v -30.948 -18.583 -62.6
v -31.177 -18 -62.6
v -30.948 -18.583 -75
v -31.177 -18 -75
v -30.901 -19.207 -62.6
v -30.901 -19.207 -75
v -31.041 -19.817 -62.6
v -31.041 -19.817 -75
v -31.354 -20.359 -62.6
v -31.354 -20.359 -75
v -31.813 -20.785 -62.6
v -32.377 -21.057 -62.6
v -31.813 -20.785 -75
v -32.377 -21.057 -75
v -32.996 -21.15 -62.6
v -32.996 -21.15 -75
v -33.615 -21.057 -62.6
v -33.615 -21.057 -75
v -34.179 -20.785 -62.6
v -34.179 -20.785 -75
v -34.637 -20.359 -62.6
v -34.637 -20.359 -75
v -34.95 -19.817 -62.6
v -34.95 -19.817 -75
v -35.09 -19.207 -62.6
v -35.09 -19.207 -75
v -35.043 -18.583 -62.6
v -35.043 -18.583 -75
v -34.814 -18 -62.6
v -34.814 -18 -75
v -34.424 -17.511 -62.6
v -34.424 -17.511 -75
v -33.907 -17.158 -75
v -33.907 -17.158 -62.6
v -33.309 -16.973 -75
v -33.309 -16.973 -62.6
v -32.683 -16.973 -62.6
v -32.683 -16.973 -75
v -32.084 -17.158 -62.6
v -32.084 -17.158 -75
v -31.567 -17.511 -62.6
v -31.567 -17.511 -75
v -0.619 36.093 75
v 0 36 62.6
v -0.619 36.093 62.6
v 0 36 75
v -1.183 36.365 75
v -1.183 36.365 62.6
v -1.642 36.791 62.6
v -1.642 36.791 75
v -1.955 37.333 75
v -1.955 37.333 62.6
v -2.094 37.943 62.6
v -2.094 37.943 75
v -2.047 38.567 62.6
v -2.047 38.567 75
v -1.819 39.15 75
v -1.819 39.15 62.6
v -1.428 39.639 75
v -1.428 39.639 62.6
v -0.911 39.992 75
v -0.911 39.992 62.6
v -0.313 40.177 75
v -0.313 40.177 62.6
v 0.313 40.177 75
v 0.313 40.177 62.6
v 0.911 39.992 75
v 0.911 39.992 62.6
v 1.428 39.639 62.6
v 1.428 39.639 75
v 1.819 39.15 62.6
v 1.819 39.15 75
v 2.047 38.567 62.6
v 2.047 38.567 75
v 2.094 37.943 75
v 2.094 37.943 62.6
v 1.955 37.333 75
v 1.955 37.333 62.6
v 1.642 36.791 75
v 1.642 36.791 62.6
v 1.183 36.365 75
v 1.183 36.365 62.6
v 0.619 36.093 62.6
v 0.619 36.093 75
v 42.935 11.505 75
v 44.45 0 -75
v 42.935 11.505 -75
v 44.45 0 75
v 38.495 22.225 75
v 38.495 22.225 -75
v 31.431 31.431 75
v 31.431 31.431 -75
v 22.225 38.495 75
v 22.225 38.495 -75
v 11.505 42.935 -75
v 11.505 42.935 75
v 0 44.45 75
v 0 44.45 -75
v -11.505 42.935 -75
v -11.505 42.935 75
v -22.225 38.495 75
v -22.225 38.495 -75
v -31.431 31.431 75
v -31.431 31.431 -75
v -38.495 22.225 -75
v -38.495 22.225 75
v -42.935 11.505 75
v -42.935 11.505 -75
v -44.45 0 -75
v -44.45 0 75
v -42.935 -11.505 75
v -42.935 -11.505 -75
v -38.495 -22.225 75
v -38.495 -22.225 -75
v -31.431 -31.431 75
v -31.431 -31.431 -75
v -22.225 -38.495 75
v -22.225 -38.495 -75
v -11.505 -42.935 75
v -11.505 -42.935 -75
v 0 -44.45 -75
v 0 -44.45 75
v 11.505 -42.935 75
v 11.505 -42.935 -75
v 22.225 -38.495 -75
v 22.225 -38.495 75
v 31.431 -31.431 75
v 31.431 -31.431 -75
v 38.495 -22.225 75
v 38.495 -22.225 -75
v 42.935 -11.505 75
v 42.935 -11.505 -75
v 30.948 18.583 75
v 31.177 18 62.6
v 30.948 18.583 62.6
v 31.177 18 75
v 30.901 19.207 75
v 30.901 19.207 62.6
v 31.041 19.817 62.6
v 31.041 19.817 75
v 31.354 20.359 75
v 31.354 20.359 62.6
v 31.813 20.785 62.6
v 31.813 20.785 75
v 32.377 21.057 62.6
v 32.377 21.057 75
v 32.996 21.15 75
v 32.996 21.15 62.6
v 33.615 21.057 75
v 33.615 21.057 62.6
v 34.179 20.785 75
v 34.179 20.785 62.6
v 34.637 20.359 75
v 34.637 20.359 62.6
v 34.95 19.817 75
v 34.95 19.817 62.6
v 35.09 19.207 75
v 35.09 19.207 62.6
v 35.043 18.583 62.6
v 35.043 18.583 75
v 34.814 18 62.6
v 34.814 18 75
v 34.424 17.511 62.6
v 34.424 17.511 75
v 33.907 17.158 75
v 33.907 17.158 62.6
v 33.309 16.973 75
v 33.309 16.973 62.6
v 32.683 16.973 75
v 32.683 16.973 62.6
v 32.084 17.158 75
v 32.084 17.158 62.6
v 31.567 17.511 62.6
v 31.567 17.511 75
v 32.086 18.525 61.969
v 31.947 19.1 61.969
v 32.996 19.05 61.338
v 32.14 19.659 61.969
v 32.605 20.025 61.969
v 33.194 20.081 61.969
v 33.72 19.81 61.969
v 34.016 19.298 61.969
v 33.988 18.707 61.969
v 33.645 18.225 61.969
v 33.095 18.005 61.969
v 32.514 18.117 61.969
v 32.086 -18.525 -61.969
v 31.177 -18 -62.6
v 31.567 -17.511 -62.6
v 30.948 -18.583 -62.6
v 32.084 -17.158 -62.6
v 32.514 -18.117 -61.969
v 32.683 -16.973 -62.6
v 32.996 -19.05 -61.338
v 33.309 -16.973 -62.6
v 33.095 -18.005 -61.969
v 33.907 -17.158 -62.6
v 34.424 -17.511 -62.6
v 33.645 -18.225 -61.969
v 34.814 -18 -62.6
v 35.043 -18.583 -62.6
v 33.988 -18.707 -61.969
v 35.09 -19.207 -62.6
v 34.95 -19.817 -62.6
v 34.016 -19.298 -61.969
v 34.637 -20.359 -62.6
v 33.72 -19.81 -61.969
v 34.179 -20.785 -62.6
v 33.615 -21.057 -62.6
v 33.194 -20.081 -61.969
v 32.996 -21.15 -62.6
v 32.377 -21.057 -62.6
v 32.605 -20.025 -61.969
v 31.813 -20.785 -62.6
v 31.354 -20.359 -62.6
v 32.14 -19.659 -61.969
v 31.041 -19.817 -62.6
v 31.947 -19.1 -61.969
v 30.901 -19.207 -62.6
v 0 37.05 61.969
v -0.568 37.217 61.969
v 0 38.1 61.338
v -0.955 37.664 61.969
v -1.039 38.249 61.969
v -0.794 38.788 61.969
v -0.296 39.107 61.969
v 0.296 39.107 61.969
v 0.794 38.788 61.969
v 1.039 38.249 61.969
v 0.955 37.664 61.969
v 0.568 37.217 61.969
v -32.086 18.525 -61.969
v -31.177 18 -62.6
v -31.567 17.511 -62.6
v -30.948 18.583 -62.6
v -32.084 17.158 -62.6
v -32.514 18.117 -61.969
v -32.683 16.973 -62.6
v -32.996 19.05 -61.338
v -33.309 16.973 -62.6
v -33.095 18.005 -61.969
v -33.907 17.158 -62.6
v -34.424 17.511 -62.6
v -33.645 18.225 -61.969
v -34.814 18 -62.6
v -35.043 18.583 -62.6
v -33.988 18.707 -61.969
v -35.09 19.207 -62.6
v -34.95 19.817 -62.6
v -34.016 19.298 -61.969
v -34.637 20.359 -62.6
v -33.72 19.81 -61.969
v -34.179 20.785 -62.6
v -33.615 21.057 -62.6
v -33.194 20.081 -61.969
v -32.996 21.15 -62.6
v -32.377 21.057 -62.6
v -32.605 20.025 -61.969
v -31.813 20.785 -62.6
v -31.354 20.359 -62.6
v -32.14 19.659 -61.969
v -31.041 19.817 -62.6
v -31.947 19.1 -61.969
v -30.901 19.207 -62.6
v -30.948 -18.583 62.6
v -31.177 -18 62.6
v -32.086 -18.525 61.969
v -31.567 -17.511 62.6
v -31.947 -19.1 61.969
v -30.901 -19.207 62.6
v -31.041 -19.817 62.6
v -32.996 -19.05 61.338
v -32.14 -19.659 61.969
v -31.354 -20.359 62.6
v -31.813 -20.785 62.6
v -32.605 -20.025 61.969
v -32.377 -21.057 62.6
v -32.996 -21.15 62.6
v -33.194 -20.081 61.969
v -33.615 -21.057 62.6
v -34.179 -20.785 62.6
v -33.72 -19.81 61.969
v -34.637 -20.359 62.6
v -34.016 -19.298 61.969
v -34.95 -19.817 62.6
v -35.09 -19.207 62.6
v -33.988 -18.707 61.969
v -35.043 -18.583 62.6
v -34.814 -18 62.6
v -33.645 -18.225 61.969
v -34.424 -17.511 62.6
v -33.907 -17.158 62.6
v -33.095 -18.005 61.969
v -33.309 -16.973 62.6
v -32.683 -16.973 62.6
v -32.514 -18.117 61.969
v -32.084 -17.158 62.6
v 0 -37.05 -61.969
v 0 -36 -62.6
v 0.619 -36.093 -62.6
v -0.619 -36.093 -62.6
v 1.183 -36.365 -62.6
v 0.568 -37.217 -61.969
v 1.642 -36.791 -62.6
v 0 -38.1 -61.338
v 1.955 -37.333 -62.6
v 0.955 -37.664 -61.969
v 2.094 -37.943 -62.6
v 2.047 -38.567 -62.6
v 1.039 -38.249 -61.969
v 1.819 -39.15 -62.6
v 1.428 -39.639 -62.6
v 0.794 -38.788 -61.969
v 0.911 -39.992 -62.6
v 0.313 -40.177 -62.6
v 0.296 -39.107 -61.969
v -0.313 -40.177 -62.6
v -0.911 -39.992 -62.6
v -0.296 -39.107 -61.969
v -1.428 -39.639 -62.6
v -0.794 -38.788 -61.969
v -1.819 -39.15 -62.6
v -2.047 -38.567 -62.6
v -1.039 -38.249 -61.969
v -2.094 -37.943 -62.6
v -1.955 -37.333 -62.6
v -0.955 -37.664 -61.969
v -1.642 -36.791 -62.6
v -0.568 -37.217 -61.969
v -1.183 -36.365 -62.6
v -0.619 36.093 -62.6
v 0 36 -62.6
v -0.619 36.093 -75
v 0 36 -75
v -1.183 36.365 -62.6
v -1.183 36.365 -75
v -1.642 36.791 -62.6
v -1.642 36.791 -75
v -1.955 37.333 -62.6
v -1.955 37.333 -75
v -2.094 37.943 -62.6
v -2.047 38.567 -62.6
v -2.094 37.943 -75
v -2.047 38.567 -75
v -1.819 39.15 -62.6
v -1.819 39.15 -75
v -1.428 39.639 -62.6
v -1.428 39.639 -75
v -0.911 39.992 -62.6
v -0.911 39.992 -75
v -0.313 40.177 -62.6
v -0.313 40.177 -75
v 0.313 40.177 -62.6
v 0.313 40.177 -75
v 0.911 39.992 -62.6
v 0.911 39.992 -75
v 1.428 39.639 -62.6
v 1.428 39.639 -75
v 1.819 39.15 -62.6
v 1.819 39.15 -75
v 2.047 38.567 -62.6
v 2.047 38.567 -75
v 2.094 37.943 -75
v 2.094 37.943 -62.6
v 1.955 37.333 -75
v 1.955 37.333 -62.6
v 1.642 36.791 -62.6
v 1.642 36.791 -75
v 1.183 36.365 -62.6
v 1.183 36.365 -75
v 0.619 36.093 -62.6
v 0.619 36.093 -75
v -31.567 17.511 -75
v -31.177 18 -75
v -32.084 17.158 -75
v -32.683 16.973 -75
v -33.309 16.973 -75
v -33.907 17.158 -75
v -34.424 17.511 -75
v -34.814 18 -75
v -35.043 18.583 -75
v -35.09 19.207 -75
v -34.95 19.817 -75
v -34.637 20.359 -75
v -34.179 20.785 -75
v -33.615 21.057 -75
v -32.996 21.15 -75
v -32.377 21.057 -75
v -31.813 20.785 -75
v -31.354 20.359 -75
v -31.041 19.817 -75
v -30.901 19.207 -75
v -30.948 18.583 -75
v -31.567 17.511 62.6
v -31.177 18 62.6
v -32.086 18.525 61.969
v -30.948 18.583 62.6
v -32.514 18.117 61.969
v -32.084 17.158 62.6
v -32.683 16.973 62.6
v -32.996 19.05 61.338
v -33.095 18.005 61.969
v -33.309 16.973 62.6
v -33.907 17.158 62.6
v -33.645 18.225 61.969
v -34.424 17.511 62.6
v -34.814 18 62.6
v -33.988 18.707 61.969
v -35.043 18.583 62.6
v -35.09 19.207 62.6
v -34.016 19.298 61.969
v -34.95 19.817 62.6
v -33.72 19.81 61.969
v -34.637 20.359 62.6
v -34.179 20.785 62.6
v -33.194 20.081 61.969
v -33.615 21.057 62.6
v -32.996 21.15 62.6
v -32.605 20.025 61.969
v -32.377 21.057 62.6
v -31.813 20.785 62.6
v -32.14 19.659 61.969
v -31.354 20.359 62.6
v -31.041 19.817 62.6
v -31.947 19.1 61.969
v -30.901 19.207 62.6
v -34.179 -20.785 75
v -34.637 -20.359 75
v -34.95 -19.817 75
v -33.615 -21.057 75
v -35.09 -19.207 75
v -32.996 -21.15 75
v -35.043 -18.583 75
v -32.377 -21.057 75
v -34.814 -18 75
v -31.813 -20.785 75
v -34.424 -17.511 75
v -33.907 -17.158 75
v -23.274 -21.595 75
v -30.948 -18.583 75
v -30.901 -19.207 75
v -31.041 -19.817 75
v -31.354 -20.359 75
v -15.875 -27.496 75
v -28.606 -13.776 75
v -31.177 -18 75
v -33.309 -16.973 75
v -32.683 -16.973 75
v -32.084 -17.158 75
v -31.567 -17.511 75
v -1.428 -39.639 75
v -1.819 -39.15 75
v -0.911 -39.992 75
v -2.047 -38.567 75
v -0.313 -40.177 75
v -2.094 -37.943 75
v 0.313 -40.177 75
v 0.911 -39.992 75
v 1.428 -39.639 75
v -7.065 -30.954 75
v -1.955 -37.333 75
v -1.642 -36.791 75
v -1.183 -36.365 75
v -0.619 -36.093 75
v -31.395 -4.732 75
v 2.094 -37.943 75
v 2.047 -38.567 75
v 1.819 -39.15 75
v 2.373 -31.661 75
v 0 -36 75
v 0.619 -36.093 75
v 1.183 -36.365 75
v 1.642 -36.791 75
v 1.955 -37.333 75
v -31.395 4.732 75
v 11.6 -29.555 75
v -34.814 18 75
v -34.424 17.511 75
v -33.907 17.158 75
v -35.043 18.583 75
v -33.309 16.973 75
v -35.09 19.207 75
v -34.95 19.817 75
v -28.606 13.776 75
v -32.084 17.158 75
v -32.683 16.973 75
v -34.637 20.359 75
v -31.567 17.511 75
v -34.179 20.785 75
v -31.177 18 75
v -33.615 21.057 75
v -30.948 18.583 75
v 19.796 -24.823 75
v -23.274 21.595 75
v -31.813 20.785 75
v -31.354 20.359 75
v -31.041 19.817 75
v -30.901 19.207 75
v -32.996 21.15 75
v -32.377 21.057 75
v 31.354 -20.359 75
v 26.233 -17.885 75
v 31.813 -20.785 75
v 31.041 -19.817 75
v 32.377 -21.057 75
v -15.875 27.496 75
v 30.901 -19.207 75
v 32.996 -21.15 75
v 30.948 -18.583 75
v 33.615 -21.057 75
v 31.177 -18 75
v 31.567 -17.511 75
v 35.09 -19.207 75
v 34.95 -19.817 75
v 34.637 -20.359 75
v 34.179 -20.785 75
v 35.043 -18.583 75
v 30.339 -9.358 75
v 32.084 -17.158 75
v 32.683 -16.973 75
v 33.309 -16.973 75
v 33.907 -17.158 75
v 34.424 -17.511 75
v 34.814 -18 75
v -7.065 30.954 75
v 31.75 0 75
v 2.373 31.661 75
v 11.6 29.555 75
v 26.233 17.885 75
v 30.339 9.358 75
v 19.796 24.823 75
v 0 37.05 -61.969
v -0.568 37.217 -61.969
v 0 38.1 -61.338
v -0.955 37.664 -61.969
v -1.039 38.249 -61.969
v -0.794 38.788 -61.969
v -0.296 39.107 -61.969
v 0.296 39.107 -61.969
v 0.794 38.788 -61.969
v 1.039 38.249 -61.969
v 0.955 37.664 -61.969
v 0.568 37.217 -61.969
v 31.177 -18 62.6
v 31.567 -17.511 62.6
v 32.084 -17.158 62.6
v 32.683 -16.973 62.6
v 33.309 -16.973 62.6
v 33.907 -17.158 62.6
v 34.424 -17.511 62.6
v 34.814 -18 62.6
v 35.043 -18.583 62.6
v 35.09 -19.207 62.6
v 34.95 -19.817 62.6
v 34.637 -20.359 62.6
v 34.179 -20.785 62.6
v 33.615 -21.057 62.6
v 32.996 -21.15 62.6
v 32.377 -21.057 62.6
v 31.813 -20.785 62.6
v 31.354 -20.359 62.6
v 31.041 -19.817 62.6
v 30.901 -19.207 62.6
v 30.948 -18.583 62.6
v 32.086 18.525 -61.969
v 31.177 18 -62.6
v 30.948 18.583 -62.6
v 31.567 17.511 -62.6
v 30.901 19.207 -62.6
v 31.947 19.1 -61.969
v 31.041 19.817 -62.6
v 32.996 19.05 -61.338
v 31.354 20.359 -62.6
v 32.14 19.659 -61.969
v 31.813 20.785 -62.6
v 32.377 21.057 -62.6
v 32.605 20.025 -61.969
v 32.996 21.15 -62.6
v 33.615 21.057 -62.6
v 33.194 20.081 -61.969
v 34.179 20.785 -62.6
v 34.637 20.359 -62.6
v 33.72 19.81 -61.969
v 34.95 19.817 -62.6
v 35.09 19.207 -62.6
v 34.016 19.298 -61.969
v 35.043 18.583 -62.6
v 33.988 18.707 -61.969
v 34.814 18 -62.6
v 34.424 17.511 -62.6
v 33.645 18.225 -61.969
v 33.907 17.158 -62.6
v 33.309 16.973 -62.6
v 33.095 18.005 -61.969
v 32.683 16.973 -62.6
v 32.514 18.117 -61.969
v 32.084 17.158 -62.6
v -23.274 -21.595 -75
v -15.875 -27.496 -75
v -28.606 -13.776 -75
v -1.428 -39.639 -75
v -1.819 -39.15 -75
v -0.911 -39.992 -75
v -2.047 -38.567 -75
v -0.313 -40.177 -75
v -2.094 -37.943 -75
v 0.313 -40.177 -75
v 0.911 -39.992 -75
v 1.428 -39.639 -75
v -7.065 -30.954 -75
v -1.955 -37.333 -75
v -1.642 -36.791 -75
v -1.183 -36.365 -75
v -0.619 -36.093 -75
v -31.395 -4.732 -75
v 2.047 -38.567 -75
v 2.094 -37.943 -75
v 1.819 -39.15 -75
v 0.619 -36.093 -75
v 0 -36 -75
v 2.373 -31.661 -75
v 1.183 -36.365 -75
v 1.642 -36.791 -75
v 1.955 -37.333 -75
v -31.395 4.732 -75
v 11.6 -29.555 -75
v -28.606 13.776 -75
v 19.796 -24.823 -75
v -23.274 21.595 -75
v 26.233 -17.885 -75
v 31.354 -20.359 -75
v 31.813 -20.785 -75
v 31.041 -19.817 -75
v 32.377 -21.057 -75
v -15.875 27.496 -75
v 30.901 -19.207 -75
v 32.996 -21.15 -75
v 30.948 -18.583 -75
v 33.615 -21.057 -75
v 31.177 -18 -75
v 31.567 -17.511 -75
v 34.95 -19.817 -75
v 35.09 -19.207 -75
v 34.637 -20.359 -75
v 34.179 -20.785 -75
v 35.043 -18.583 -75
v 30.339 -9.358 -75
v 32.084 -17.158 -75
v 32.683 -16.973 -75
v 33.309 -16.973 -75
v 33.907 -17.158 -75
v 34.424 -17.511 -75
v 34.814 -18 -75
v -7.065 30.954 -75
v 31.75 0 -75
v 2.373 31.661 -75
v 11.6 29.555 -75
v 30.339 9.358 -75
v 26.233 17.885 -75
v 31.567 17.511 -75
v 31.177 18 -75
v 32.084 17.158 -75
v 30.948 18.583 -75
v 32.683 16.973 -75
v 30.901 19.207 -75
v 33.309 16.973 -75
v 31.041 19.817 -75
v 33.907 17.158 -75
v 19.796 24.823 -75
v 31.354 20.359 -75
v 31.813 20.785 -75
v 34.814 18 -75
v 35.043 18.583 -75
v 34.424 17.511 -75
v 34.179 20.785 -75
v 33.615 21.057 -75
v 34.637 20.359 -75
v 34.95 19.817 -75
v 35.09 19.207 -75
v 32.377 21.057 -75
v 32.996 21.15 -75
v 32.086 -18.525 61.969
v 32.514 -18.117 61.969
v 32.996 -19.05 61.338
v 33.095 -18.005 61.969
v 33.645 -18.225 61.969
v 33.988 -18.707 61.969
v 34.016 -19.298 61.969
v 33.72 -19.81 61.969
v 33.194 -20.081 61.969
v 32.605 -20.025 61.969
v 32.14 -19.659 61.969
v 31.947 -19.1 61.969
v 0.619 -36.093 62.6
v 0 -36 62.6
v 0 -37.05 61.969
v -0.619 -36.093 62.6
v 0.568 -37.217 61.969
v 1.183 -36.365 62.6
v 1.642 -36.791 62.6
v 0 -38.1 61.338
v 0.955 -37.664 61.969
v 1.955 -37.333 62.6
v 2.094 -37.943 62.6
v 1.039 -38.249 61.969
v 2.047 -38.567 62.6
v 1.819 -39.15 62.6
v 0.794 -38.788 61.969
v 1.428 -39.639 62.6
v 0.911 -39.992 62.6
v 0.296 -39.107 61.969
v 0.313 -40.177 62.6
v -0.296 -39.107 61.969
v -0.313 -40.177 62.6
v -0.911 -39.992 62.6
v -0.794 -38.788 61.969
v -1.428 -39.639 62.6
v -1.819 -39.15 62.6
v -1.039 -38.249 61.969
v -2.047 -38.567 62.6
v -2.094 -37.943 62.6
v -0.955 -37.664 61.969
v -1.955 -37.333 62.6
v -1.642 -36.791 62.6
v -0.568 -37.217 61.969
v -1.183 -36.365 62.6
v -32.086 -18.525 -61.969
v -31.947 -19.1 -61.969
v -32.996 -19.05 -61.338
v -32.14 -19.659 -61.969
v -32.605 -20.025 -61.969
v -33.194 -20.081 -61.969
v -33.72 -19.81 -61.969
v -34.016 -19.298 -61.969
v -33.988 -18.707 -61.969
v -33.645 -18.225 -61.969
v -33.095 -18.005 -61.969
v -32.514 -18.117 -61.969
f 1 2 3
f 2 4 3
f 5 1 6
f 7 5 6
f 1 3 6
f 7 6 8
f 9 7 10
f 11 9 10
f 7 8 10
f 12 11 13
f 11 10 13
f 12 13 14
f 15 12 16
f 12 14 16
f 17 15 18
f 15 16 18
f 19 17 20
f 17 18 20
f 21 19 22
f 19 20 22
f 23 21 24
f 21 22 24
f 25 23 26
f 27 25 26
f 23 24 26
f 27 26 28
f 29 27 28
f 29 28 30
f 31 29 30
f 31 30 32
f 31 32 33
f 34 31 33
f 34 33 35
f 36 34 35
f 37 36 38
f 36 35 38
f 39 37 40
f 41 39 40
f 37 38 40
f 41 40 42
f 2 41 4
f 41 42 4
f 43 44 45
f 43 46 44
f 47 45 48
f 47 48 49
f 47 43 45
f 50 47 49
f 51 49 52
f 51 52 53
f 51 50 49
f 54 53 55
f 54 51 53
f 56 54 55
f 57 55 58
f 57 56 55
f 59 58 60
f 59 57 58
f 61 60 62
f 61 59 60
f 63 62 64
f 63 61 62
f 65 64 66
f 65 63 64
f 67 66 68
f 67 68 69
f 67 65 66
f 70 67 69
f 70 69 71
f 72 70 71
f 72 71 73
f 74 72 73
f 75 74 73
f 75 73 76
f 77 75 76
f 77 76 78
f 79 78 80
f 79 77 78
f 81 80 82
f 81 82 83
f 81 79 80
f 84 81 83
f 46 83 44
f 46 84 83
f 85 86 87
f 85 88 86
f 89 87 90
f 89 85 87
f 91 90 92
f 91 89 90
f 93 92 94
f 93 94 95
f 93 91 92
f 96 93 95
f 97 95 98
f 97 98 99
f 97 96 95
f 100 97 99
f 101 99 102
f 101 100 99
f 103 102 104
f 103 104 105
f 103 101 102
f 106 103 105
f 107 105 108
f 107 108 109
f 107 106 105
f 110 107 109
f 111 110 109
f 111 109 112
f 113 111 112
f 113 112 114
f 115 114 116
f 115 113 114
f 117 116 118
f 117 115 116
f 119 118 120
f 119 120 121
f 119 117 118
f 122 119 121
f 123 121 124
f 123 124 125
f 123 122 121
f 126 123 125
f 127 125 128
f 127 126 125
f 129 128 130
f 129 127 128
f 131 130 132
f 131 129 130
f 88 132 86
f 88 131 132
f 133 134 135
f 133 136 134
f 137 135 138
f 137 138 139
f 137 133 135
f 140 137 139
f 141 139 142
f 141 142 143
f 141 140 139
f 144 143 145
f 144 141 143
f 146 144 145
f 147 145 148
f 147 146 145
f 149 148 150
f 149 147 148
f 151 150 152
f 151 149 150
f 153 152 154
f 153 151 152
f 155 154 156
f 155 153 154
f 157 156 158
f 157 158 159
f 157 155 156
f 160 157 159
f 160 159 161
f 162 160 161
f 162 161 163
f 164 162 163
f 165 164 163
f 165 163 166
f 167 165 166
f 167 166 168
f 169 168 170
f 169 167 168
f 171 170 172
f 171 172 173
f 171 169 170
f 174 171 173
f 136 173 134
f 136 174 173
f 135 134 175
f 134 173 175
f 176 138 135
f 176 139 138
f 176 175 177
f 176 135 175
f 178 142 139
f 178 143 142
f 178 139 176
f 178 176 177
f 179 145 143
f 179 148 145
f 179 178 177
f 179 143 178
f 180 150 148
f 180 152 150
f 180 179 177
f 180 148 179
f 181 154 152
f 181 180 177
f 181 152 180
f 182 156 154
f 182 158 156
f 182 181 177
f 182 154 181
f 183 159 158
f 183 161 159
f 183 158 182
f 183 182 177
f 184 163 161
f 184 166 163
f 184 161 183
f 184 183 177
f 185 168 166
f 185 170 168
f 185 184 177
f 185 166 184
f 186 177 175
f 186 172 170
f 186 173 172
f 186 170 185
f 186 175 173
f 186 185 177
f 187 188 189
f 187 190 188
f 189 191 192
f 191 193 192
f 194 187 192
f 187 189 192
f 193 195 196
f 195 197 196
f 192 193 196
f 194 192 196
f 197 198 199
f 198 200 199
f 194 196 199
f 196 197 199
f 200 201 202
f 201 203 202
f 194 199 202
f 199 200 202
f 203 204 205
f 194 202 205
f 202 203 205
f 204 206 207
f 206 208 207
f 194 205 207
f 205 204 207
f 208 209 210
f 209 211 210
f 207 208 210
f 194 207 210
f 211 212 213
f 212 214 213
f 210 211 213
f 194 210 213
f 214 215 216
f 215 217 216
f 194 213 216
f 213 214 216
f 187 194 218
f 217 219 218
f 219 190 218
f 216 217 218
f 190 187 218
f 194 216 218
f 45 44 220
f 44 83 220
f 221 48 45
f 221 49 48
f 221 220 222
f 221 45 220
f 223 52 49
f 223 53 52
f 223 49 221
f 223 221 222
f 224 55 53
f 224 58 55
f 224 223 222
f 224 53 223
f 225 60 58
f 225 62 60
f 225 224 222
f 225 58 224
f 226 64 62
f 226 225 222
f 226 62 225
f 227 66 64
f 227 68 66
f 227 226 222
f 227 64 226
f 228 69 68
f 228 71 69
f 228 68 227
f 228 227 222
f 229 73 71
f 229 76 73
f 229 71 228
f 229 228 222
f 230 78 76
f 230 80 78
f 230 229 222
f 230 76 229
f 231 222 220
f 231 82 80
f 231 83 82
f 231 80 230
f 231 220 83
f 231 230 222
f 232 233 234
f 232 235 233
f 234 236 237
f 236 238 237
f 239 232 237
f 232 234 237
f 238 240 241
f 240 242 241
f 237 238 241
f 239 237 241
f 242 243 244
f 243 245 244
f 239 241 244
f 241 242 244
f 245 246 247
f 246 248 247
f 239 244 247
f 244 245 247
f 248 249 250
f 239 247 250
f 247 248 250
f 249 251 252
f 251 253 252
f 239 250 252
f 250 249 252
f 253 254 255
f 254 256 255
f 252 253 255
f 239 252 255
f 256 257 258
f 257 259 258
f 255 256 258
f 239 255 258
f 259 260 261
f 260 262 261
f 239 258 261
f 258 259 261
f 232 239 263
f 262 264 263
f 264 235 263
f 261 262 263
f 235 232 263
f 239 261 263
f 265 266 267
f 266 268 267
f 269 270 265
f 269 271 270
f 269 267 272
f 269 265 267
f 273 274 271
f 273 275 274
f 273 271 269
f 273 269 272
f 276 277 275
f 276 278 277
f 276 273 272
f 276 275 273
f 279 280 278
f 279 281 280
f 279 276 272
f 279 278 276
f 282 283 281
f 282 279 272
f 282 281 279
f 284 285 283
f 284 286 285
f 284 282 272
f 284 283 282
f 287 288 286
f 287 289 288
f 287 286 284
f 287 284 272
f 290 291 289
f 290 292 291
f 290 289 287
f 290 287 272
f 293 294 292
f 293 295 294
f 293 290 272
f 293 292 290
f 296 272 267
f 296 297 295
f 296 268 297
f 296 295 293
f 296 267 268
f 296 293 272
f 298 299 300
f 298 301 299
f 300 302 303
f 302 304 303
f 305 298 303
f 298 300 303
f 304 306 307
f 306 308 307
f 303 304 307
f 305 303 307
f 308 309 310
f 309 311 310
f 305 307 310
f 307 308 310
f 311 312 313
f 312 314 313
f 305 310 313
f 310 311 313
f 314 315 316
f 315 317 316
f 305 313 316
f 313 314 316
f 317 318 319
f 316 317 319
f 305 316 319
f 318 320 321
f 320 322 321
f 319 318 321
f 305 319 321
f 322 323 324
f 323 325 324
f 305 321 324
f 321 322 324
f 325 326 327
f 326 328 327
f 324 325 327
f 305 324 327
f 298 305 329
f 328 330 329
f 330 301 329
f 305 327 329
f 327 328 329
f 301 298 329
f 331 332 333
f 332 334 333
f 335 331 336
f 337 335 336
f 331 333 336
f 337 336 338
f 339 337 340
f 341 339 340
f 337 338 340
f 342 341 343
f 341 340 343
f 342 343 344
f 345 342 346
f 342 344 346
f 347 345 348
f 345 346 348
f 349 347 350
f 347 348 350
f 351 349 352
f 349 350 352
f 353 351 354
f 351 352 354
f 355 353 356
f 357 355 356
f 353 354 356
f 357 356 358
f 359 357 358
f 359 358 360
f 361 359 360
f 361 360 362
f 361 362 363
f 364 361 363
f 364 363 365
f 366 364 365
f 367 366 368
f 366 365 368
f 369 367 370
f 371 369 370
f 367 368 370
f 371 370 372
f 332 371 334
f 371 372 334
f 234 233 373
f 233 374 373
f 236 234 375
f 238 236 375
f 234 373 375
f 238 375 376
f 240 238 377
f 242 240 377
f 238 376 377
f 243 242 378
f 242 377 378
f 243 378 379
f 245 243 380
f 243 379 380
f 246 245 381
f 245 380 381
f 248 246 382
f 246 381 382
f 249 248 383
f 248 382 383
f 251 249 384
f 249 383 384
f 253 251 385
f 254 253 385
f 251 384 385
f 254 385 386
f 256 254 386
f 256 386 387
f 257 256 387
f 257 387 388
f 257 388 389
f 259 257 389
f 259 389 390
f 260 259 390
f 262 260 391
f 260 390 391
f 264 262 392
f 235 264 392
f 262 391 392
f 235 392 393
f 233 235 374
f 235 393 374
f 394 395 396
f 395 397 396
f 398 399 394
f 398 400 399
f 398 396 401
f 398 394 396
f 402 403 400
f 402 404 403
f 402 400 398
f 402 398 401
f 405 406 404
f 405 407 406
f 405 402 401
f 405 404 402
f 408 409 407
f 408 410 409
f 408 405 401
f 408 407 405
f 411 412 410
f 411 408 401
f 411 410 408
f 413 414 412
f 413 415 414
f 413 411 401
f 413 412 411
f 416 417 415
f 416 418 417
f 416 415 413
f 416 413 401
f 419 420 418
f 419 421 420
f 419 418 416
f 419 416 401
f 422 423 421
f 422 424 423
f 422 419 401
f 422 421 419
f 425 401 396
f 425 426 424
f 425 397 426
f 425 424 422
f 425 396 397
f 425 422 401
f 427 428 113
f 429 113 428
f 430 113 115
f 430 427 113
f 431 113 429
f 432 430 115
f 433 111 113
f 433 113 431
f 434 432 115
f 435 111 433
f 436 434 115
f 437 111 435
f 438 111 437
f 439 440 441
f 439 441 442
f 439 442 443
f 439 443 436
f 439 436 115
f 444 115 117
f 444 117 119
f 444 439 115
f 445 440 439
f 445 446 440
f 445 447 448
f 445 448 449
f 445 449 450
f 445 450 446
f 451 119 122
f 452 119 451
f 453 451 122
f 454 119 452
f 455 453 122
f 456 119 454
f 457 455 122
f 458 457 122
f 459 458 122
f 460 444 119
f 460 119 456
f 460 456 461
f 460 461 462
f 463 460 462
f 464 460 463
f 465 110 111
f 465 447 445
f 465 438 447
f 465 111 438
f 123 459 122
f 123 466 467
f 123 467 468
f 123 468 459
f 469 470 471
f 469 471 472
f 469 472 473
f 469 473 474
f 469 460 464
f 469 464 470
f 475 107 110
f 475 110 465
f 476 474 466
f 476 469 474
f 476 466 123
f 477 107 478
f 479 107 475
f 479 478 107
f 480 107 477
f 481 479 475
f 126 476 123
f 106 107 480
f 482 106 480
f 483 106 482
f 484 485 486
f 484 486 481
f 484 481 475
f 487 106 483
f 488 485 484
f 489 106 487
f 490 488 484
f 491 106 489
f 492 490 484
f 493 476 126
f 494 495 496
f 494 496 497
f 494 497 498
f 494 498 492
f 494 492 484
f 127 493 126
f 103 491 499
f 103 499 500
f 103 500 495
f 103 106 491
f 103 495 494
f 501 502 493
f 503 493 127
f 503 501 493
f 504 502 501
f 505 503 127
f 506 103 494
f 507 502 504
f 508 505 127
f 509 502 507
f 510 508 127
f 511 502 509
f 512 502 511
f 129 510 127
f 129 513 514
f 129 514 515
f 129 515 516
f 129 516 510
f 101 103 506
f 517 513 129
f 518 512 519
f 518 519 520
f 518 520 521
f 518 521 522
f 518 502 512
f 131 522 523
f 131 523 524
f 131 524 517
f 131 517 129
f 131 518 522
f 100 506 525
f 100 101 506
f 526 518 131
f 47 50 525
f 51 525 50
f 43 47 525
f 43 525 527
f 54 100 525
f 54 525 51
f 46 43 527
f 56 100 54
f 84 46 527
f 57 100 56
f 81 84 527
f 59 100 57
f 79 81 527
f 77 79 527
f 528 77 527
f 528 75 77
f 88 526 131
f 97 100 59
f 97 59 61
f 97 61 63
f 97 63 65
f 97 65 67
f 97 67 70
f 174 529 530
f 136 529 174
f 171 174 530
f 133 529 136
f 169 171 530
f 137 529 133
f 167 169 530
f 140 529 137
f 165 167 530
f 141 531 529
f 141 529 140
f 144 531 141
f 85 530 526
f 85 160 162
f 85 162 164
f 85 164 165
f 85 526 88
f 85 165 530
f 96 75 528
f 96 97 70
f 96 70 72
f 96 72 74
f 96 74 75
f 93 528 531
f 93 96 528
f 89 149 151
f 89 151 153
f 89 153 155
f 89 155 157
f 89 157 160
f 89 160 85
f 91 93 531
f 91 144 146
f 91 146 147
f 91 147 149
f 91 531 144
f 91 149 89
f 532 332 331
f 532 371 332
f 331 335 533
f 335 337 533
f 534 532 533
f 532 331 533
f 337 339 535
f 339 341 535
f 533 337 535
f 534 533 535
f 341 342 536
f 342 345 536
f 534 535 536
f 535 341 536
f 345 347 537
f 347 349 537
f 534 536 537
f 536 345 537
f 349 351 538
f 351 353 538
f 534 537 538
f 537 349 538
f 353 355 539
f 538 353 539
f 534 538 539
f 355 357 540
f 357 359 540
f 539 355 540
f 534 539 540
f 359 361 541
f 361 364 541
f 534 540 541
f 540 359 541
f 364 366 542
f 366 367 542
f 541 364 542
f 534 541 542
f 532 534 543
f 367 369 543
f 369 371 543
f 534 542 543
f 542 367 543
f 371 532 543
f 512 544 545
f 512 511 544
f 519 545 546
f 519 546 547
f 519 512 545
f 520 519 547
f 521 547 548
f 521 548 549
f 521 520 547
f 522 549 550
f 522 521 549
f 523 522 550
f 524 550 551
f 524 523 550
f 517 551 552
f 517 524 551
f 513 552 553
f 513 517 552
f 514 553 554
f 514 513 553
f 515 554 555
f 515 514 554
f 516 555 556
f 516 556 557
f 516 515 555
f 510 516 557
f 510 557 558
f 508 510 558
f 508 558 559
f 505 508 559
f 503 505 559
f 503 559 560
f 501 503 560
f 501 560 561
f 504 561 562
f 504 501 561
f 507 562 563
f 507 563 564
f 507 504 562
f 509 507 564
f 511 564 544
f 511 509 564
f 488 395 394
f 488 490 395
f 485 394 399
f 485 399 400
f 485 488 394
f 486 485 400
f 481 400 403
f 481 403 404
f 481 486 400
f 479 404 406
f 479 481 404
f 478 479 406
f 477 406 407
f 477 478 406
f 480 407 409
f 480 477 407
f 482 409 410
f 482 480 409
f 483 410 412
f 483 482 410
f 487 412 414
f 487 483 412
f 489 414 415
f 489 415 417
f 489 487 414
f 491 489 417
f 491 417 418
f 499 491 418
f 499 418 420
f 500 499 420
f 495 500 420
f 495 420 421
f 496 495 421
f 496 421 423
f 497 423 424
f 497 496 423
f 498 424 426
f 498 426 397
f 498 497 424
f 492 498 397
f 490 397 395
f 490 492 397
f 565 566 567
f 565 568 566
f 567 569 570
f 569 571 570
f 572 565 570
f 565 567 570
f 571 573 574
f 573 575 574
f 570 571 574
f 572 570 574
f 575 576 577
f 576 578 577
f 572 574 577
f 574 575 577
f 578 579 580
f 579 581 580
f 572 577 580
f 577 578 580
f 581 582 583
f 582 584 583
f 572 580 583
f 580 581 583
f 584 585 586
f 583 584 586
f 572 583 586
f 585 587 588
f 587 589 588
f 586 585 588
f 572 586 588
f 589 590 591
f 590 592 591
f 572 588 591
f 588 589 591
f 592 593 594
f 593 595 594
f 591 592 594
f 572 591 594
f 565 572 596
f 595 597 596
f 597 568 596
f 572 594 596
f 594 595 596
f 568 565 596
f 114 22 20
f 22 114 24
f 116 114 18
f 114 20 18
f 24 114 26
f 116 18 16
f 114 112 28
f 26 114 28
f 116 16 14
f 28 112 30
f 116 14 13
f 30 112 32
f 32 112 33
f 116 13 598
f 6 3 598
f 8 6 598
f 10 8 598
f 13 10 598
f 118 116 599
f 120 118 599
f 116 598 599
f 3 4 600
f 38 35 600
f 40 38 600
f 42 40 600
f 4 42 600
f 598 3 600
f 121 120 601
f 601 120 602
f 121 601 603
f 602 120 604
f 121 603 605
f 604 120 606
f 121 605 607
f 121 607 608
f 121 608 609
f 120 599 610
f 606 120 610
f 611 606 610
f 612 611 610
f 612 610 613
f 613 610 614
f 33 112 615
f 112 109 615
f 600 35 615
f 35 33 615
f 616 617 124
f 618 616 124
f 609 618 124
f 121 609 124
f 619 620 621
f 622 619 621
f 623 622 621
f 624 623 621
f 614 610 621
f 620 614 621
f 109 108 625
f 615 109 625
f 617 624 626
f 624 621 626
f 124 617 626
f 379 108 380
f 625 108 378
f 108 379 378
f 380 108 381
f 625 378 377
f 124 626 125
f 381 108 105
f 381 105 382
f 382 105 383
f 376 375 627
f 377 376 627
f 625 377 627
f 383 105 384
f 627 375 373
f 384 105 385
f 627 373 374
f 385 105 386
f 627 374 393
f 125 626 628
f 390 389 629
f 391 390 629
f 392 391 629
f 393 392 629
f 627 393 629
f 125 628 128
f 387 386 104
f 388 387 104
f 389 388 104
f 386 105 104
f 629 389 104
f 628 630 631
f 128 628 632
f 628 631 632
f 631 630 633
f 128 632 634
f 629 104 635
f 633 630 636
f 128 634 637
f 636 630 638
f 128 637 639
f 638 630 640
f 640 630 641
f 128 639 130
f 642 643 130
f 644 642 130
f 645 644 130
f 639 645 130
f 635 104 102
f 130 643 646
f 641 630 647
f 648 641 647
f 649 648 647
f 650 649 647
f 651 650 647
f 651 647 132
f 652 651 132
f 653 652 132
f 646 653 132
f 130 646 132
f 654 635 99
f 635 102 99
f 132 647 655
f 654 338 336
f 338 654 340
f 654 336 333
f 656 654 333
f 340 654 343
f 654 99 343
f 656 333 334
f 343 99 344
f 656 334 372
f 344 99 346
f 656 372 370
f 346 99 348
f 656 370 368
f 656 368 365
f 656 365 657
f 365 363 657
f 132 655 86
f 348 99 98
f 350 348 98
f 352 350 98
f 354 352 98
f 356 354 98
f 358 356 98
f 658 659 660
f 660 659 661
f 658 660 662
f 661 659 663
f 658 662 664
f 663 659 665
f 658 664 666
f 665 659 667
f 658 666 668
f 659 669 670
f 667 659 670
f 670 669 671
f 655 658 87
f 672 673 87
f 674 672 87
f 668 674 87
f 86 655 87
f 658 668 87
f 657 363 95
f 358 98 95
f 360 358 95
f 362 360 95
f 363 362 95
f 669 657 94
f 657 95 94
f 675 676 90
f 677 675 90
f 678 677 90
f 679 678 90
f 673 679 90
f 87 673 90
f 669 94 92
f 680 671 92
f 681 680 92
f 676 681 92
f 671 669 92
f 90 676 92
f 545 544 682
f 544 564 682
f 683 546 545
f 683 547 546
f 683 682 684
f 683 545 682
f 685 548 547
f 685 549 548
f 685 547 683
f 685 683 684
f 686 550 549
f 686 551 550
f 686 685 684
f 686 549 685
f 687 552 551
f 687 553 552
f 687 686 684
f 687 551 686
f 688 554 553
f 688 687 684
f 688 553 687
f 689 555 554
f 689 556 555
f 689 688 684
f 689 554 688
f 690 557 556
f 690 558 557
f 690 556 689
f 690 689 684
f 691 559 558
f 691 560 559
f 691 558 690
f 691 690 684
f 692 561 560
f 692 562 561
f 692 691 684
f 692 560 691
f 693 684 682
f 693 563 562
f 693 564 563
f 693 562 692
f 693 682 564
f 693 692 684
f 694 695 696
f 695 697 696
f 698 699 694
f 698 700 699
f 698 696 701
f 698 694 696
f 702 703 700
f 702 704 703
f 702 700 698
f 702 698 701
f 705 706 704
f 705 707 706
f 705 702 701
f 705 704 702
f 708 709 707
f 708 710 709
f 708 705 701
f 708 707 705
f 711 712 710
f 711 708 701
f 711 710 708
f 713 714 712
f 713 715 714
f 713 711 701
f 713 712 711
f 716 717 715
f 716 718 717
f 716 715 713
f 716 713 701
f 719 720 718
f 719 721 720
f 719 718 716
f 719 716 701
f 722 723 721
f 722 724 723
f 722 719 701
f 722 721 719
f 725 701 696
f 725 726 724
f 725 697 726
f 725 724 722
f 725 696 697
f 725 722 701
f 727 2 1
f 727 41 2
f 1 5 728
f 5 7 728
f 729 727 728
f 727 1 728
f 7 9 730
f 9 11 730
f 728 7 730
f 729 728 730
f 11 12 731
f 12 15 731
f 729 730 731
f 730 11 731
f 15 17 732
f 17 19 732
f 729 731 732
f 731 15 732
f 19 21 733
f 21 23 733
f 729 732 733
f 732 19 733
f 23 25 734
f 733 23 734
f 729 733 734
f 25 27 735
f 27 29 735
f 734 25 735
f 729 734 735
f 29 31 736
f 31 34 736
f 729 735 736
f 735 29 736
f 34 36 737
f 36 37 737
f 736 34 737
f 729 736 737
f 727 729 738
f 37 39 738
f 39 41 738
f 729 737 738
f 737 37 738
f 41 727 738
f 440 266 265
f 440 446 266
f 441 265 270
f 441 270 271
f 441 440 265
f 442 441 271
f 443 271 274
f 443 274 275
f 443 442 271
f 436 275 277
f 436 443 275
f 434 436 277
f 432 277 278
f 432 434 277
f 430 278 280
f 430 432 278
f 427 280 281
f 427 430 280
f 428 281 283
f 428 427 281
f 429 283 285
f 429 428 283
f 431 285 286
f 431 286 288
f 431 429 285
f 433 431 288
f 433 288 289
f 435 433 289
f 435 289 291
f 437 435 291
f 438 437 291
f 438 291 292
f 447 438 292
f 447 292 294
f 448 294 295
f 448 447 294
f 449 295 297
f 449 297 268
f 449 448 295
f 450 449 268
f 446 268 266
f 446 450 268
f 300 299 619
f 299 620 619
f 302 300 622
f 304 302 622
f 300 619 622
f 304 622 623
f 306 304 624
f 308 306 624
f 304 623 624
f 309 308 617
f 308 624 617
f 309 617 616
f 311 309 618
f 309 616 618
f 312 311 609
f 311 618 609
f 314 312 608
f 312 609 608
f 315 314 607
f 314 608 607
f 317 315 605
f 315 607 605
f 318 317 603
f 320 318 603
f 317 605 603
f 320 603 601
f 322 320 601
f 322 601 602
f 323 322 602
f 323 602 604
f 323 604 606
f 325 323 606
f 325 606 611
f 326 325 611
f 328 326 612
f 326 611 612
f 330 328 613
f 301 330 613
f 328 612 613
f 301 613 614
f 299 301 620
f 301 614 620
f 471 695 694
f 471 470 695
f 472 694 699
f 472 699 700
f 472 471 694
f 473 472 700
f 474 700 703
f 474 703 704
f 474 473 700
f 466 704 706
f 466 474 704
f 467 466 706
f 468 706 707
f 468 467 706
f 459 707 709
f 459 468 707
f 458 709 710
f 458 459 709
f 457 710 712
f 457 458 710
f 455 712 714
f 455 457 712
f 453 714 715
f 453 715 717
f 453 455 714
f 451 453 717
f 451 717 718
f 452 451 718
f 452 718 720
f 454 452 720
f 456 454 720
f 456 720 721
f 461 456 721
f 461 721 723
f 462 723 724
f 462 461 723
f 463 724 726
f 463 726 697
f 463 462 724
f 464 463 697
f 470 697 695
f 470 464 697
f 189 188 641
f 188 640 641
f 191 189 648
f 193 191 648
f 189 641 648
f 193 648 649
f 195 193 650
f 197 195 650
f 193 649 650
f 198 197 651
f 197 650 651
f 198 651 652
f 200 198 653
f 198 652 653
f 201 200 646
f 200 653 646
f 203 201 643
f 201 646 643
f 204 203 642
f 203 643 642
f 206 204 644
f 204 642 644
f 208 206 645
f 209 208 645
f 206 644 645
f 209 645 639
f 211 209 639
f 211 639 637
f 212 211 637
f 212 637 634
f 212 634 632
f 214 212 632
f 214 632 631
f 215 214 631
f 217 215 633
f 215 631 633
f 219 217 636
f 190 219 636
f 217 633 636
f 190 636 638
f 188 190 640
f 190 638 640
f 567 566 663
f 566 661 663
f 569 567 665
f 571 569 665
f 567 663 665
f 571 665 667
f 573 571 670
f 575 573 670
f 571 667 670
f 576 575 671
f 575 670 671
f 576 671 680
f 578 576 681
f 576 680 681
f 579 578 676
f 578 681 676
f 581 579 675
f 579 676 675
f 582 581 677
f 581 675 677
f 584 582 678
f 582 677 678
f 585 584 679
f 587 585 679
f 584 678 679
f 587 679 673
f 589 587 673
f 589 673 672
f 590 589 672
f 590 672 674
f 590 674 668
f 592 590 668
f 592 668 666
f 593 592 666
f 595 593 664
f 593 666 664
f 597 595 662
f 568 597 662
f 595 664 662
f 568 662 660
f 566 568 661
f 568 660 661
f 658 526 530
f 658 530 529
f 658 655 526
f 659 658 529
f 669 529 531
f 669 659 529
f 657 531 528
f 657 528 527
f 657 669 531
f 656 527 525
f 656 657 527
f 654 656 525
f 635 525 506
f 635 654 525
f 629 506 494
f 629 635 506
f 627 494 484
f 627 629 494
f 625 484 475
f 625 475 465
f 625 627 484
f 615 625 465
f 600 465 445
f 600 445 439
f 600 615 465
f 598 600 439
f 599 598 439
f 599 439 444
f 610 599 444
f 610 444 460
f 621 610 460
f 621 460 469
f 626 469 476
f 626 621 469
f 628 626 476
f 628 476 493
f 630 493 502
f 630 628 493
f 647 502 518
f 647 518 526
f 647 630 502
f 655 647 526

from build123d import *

# Parameters (mm, degrees)
SKETCH1_R           = 44.45
SKETCH1_R_2         = 31.75
BOSS_EXTRUDE1_DEPTH = 75
CIRPATTERN1_COUNT   = 6


with BuildPart() as part:
    # Sketch1 → Boss-Extrude1 (new body, symmetric)
    with BuildSketch(Plane.XY):
        Circle(SKETCH1_R)
        Circle(SKETCH1_R_2, mode=Mode.SUBTRACT)
    extrude(amount=BOSS_EXTRUDE1_DEPTH, both=True)

    # Sketch3 → M5x0.8 Tapped Hole1 (revolve, cut)
    with BuildSketch(Plane(origin=(0, 38.1, 75), x_dir=(0, -1, 0), z_dir=(1, 0, 0))):
        Polygon((0, 0), (0, 13.6618073), (2.1, 12.4), (2.1, 0), align=None)
    m5x0_8_tapped_hole1 = revolve(axis=Axis((0, 38.1, 81.35), (0, 0, -1)), mode=Mode.SUBTRACT)

    # CirPattern1: M5x0.8 Tapped Hole1 ×6 about axis
    cirpattern1_axis = Axis((0, 0, 0), (0, 0, 1))
    for i in range(1, CIRPATTERN1_COUNT):
        add(m5x0_8_tapped_hole1.rotate(cirpattern1_axis, i * 360 / CIRPATTERN1_COUNT), mode=Mode.SUBTRACT)

    # Mirror1: M5x0.8 Tapped Hole1 across plane
    add(m5x0_8_tapped_hole1.mirror(Plane.XY), mode=Mode.SUBTRACT)

    # Mirror1 copy 1 sketch → Mirror1 copy 1 (revolve, cut)
    with BuildSketch(Plane(origin=(-32.995567884, 19.05, -75), x_dir=(0.866025404, -0.5, 0), z_dir=(0.5, 0.866025404, 0))):
        Polygon((0, 0), (0, -13.6618073), (2.1, -12.4), (2.1, 0), align=None)
    revolve(axis=Axis((-32.995567884, 19.05, -81.35), (0, 0, -1)), mode=Mode.SUBTRACT)

    # Mirror1 copy 2 sketch → Mirror1 copy 2 (revolve, cut)
    with BuildSketch(Plane(origin=(-32.995567884, -19.05, -75), x_dir=(0.866025404, 0.5, 0), z_dir=(-0.5, 0.866025404, 0))):
        Polygon((0, 0), (0, -13.6618073), (2.1, -12.4), (2.1, 0), align=None)
    revolve(axis=Axis((-32.995567884, -19.05, -81.35), (0, 0, -1)), mode=Mode.SUBTRACT)

    # Mirror1 copy 3 sketch → Mirror1 copy 3 (revolve, cut)
    with BuildSketch(Plane(origin=(0, -38.1, -75), x_dir=(0, 1, 0), z_dir=(-1, 0, 0))):
        Polygon((0, 0), (0, -13.6618073), (2.1, -12.4), (2.1, 0), align=None)
    revolve(axis=Axis((0, -38.1, -81.35), (0, 0, -1)), mode=Mode.SUBTRACT)

    # Mirror1 copy 4 sketch → Mirror1 copy 4 (revolve, cut)
    with BuildSketch(Plane(origin=(32.995567884, -19.05, -75), x_dir=(-0.866025404, 0.5, 0), z_dir=(-0.5, -0.866025404, 0))):
        Polygon((0, 0), (0, -13.6618073), (2.1, -12.4), (2.1, 0), align=None)
    revolve(axis=Axis((32.995567884, -19.05, -81.35), (0, 0, -1)), mode=Mode.SUBTRACT)

    # Mirror1 copy 5 sketch → Mirror1 copy 5 (revolve, cut)
    with BuildSketch(Plane(origin=(32.995567884, 19.05, -75), x_dir=(-0.866025404, -0.5, 0), z_dir=(0.5, -0.866025404, 0))):
        Polygon((0, 0), (0, -13.6618073), (2.1, -12.4), (2.1, 0), align=None)
    revolve(axis=Axis((32.995567884, 19.05, -81.35), (0, 0, -1)), mode=Mode.SUBTRACT)


solid = part.part
